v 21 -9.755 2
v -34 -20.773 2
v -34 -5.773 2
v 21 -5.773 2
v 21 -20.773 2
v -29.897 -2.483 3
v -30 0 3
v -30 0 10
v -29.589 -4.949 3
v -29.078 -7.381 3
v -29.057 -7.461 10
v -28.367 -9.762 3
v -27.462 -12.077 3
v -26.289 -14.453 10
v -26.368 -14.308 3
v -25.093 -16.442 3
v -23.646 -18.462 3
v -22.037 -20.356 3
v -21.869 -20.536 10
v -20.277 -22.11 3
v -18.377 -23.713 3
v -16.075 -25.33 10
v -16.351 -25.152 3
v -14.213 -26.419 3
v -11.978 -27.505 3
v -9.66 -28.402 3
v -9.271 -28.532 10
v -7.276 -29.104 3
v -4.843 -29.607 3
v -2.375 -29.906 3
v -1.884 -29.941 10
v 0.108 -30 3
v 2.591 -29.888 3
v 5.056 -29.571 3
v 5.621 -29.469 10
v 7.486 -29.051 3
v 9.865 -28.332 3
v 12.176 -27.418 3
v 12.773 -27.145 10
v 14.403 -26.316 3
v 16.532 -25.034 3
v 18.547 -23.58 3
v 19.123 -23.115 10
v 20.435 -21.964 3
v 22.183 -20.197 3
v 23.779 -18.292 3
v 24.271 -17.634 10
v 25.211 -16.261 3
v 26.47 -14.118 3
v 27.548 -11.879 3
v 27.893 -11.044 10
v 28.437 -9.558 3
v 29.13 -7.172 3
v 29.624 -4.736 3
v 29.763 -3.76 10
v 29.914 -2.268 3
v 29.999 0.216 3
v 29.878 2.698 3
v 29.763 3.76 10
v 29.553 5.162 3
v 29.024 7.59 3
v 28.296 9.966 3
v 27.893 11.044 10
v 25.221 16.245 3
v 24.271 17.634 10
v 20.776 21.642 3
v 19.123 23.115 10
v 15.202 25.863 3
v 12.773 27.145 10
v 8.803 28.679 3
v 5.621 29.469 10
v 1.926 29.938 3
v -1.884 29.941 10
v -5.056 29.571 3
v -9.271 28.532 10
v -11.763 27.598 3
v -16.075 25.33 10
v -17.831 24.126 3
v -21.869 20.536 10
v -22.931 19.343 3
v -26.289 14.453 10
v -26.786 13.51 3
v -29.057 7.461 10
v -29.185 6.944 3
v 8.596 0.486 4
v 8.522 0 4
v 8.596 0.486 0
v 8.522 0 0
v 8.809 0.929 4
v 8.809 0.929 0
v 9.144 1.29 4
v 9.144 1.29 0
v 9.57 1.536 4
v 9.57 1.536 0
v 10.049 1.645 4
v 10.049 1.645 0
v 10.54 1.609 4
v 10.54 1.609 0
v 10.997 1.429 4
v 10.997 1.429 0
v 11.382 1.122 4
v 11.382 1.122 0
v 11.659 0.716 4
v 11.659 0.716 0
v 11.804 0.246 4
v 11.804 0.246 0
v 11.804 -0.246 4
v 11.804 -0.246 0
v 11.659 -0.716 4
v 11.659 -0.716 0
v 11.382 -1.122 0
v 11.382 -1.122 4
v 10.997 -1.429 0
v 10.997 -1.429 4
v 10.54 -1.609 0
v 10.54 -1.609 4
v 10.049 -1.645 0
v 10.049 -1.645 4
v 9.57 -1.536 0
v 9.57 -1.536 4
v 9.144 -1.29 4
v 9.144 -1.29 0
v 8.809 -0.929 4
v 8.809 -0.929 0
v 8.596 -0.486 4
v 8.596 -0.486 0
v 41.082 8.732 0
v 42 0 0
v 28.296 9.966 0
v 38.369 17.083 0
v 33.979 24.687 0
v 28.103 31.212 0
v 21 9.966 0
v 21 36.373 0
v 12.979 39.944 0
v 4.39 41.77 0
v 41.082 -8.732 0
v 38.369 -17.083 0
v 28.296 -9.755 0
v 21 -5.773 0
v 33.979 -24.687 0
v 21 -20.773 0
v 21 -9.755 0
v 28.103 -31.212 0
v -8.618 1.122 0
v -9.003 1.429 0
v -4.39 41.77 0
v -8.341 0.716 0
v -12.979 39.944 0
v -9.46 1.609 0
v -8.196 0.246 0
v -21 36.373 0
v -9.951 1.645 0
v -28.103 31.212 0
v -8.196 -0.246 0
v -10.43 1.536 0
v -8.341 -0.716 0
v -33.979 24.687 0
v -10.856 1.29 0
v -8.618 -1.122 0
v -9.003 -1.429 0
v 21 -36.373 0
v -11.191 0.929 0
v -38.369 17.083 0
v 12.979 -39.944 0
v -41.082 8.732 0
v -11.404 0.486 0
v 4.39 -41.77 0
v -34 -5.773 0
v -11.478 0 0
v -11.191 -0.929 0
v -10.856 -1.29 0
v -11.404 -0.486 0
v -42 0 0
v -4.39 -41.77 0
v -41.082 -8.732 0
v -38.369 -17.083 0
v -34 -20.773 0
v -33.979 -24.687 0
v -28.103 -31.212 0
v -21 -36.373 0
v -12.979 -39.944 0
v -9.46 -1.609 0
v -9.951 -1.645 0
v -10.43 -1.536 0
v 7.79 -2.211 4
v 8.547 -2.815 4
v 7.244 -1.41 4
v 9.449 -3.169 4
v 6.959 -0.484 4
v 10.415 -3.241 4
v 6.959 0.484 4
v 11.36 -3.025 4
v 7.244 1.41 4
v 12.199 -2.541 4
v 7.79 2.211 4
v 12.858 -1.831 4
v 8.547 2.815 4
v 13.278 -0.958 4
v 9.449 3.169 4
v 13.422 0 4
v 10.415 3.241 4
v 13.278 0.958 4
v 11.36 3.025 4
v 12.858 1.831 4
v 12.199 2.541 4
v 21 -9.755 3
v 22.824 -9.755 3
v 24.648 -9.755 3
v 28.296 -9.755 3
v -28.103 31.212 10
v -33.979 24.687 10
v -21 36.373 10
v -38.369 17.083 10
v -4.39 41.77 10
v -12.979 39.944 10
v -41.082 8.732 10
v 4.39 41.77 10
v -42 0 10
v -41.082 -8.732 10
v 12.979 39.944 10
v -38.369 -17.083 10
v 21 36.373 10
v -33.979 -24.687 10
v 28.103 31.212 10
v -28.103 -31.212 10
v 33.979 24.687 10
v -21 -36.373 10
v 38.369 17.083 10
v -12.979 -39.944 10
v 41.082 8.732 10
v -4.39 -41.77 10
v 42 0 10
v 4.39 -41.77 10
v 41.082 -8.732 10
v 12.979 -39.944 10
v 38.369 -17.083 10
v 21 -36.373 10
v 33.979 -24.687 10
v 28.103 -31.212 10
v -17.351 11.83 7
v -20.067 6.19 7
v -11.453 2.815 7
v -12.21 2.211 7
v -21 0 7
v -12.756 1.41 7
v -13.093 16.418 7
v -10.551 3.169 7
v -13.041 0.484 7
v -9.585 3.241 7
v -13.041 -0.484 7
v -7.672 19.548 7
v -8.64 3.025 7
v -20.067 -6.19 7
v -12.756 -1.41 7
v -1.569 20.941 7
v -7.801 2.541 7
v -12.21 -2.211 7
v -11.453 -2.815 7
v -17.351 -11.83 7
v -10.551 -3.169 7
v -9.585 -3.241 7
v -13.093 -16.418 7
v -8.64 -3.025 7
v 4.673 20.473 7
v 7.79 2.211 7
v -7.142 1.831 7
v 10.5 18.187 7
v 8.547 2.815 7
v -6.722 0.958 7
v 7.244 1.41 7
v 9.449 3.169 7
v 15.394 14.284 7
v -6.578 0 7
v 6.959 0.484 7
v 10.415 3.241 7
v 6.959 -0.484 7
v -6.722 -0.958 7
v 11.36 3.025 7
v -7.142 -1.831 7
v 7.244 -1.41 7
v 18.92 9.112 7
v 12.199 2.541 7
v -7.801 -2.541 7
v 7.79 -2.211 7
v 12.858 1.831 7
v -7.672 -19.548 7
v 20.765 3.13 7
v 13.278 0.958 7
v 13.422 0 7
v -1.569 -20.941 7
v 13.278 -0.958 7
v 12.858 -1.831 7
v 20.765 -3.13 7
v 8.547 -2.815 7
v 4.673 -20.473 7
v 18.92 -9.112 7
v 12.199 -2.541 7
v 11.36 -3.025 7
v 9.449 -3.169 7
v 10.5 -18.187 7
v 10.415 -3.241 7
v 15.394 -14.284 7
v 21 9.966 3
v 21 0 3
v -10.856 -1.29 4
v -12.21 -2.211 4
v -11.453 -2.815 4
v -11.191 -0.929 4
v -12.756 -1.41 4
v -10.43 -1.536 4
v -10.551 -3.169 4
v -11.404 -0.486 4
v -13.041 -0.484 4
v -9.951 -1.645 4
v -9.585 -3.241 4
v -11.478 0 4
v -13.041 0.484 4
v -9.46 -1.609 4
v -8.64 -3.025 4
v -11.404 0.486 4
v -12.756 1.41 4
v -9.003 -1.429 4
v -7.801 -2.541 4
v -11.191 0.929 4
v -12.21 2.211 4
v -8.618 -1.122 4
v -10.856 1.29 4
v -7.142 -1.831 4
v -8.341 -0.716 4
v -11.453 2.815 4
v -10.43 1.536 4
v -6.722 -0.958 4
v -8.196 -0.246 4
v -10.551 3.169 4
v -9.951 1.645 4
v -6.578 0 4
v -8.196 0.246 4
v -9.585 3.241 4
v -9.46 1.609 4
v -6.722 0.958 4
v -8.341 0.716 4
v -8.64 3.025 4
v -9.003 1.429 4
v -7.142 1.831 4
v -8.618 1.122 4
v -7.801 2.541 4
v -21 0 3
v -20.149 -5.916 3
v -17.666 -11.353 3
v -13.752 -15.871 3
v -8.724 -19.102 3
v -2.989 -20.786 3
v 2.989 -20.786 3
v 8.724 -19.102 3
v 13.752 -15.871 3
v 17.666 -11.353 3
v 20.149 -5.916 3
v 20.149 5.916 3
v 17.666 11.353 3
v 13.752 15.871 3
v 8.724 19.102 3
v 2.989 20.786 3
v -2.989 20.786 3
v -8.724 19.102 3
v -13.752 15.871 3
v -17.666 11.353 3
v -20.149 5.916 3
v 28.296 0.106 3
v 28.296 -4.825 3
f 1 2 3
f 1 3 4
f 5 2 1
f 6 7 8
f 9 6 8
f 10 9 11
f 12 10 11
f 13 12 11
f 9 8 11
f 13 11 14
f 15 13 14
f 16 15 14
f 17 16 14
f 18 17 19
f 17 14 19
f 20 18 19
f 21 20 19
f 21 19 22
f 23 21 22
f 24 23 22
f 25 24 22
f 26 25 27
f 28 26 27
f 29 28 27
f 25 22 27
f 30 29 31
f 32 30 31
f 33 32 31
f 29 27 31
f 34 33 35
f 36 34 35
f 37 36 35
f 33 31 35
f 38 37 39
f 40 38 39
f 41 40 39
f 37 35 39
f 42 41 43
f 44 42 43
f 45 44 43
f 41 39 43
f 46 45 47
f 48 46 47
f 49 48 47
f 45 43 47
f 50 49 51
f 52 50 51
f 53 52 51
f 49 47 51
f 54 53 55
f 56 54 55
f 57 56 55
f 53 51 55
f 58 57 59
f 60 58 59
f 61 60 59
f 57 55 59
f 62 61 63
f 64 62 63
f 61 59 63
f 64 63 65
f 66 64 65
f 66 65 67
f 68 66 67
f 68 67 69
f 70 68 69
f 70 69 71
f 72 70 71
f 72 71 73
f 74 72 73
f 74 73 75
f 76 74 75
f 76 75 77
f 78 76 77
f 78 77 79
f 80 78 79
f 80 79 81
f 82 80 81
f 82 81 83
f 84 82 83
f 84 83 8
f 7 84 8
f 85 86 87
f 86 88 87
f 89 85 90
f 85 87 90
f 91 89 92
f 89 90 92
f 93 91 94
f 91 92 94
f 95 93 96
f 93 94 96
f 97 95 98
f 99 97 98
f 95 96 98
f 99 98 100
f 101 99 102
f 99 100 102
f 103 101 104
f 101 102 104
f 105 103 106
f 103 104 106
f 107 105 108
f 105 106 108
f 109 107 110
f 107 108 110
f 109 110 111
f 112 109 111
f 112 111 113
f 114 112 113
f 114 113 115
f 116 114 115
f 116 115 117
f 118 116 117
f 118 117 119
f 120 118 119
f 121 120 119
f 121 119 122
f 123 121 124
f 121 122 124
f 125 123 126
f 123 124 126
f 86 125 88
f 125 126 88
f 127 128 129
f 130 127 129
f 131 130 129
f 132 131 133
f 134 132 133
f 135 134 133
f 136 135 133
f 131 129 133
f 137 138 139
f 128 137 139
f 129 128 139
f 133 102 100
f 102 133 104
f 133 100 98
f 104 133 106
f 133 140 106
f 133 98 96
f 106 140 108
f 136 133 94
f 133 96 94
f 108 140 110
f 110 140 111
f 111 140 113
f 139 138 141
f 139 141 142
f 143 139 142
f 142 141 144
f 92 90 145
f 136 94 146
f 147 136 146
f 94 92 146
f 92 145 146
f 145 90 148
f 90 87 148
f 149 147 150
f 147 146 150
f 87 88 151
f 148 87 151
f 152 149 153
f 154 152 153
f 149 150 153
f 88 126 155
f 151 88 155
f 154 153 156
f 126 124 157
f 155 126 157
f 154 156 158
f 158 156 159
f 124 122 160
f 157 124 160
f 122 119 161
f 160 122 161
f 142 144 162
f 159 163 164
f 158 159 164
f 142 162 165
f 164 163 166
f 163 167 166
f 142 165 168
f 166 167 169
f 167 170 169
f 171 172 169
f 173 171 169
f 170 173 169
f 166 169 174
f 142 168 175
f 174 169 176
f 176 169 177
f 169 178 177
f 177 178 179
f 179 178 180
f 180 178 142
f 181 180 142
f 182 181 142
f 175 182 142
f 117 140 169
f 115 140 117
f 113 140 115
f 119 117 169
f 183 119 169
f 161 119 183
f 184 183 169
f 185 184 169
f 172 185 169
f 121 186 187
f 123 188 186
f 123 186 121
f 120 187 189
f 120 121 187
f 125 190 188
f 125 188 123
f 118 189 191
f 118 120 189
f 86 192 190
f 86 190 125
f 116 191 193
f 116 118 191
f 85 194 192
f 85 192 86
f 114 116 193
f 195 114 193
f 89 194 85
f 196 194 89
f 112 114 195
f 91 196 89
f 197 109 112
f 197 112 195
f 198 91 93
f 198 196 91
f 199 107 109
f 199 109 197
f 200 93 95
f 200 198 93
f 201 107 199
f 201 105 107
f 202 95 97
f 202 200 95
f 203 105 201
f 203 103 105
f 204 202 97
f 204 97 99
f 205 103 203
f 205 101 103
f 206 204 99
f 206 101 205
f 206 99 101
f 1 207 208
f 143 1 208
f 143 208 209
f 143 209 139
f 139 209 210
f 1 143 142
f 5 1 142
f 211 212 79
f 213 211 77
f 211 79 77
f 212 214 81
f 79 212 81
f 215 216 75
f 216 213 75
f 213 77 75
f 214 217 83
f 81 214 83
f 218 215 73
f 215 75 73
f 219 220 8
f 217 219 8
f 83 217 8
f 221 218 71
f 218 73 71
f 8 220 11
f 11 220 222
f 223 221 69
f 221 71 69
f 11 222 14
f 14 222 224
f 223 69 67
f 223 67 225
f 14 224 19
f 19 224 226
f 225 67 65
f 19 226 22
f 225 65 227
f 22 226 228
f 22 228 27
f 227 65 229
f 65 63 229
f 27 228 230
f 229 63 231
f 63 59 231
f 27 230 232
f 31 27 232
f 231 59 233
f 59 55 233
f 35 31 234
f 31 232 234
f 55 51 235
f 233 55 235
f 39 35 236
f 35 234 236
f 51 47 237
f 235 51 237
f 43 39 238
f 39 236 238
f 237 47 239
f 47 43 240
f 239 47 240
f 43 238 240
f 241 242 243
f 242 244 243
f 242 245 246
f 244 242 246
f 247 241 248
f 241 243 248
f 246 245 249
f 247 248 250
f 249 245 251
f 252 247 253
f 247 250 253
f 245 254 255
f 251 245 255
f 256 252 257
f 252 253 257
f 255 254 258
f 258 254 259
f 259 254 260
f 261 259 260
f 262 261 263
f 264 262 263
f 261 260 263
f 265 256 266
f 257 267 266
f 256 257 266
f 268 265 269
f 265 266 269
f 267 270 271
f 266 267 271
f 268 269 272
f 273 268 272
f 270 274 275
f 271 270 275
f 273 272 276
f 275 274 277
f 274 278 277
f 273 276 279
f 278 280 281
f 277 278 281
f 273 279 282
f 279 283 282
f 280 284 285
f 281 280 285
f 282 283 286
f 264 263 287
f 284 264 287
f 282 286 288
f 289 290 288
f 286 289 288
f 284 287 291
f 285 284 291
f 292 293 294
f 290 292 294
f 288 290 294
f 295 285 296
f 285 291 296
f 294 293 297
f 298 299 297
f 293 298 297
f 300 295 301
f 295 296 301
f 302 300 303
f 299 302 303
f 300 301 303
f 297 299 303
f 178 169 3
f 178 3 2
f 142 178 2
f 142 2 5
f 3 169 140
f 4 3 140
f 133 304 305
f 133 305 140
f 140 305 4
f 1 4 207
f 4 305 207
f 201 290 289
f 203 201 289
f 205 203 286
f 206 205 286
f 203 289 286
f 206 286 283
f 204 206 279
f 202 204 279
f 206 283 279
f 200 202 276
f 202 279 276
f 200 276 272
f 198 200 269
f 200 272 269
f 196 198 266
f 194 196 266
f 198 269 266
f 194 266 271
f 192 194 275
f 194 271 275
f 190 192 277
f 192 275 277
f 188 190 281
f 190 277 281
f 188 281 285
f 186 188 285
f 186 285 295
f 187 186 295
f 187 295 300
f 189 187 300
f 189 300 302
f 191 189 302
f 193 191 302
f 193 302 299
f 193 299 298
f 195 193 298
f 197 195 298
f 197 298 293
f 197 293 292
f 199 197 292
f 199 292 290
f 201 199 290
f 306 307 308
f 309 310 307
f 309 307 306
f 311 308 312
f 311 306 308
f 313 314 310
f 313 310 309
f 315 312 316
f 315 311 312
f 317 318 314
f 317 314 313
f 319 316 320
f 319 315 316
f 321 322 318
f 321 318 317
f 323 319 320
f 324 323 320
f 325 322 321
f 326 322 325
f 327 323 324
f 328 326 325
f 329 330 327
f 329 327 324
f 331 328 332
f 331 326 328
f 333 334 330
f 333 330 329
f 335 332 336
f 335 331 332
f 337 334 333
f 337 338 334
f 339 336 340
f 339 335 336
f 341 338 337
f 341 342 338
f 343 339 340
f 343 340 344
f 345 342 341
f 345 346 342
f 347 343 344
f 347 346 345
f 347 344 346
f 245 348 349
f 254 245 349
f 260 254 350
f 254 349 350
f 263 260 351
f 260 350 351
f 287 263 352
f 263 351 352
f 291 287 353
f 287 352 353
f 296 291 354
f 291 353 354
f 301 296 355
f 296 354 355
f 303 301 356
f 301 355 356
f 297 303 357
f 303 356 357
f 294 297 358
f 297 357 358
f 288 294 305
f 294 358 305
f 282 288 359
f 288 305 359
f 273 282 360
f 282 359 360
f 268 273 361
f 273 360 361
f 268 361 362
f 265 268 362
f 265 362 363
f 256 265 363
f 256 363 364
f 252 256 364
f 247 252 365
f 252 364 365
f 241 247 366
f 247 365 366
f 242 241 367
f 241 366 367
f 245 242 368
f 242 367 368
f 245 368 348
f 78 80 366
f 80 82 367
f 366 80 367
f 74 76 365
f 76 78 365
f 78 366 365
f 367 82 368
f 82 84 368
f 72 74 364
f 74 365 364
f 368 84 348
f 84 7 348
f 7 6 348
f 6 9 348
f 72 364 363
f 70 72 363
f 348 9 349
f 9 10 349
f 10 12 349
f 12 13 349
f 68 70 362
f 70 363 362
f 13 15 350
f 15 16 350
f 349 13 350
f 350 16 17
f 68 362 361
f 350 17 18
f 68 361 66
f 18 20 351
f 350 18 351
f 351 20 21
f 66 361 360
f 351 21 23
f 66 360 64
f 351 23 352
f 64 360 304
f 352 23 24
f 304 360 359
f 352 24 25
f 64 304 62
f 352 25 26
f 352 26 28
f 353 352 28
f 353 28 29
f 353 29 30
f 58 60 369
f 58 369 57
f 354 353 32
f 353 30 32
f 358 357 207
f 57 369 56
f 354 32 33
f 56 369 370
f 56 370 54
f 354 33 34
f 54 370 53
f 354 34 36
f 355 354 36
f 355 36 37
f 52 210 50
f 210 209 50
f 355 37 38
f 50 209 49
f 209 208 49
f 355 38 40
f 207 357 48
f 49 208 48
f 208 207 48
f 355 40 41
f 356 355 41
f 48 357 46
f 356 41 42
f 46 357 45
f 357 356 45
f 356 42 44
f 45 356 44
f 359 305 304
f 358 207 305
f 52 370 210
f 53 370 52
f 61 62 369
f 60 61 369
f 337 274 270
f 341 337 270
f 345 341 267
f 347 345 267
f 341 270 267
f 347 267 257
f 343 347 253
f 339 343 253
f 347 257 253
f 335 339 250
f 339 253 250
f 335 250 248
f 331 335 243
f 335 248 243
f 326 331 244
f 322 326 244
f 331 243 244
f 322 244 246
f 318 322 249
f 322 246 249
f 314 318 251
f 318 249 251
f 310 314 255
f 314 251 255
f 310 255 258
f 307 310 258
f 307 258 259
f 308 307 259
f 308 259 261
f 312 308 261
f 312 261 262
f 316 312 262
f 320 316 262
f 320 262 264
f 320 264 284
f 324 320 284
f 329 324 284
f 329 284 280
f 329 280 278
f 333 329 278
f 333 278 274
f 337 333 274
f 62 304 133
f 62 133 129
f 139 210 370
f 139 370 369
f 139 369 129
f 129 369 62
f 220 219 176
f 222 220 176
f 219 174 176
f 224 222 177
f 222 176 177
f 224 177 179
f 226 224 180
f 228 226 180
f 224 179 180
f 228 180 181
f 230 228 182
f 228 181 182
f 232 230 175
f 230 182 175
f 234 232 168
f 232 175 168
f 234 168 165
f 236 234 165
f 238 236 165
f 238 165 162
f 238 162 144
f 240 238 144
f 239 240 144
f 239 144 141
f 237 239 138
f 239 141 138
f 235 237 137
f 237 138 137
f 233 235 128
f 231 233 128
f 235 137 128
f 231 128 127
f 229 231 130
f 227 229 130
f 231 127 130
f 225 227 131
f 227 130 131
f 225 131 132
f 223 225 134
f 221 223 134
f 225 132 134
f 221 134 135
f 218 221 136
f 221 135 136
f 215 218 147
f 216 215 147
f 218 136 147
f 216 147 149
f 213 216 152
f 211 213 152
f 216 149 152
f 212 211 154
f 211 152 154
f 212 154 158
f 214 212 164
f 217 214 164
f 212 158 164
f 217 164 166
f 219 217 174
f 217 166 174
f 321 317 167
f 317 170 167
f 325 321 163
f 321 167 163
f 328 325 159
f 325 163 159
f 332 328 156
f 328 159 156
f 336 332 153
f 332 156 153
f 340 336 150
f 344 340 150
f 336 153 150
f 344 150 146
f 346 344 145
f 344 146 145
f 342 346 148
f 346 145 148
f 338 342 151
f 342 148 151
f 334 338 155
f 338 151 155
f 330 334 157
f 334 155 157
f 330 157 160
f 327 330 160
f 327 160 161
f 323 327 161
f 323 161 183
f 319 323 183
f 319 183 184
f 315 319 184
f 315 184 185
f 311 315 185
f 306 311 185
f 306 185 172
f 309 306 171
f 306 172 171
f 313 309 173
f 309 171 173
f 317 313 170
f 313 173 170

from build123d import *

# Parameters (mm, degrees)
F2_W           = 7.2961132542
F2_H           = 9.9664424297
F2_H_2         = 9.7550563514
F3_DEPTH       = 25
F4_W           = 55
F4_H           = 15
F5_DEPTH       = 2
F7_D           = 3.3
F7_CBORE_D     = 6.5
F7_CBORE_DEPTH = 3


with BuildPart() as f1:
    # F0 (on Front) → F1 (revolve)
    with BuildSketch(Plane.XZ):
        Polygon((-42, 0), (0, 0), (0, 7), (-21, 7), (-21, 3), (-30, 3), (-30, 10), (-42, 10), align=None)
    revolve(axis=Axis((0, 0, 3.5), (0, 0, 1)))

    # F2 (on face) → F3 (cut)
    with BuildSketch(Plane.XY.offset(3)):
        with Locations((24.6480566271, 4.9832212149)):
            Rectangle(F2_W, F2_H)
        with Locations((24.6480566271, -4.8775281757)):
            Rectangle(F2_W, F2_H_2)
    extrude(amount=-F3_DEPTH, mode=Mode.SUBTRACT)

    # F4 (on face) → F5 (cut)
    with BuildSketch(Plane(origin=(0, 0, 0), x_dir=(1, 0, 0), z_dir=(0, 0, -1))):
        with Locations((-6.5, 13.2730269618)):
            Rectangle(F4_W, F4_H)
    extrude(amount=-F5_DEPTH, mode=Mode.SUBTRACT)

    # F7 (through all)
    with Locations(Plane.XY.offset(7)):
        with Locations((-9.8275868147, 0), (10.1724131853, 0)):
            CounterBoreHole(F7_D / 2, F7_CBORE_D / 2, F7_CBORE_DEPTH)


solid = f1.part
